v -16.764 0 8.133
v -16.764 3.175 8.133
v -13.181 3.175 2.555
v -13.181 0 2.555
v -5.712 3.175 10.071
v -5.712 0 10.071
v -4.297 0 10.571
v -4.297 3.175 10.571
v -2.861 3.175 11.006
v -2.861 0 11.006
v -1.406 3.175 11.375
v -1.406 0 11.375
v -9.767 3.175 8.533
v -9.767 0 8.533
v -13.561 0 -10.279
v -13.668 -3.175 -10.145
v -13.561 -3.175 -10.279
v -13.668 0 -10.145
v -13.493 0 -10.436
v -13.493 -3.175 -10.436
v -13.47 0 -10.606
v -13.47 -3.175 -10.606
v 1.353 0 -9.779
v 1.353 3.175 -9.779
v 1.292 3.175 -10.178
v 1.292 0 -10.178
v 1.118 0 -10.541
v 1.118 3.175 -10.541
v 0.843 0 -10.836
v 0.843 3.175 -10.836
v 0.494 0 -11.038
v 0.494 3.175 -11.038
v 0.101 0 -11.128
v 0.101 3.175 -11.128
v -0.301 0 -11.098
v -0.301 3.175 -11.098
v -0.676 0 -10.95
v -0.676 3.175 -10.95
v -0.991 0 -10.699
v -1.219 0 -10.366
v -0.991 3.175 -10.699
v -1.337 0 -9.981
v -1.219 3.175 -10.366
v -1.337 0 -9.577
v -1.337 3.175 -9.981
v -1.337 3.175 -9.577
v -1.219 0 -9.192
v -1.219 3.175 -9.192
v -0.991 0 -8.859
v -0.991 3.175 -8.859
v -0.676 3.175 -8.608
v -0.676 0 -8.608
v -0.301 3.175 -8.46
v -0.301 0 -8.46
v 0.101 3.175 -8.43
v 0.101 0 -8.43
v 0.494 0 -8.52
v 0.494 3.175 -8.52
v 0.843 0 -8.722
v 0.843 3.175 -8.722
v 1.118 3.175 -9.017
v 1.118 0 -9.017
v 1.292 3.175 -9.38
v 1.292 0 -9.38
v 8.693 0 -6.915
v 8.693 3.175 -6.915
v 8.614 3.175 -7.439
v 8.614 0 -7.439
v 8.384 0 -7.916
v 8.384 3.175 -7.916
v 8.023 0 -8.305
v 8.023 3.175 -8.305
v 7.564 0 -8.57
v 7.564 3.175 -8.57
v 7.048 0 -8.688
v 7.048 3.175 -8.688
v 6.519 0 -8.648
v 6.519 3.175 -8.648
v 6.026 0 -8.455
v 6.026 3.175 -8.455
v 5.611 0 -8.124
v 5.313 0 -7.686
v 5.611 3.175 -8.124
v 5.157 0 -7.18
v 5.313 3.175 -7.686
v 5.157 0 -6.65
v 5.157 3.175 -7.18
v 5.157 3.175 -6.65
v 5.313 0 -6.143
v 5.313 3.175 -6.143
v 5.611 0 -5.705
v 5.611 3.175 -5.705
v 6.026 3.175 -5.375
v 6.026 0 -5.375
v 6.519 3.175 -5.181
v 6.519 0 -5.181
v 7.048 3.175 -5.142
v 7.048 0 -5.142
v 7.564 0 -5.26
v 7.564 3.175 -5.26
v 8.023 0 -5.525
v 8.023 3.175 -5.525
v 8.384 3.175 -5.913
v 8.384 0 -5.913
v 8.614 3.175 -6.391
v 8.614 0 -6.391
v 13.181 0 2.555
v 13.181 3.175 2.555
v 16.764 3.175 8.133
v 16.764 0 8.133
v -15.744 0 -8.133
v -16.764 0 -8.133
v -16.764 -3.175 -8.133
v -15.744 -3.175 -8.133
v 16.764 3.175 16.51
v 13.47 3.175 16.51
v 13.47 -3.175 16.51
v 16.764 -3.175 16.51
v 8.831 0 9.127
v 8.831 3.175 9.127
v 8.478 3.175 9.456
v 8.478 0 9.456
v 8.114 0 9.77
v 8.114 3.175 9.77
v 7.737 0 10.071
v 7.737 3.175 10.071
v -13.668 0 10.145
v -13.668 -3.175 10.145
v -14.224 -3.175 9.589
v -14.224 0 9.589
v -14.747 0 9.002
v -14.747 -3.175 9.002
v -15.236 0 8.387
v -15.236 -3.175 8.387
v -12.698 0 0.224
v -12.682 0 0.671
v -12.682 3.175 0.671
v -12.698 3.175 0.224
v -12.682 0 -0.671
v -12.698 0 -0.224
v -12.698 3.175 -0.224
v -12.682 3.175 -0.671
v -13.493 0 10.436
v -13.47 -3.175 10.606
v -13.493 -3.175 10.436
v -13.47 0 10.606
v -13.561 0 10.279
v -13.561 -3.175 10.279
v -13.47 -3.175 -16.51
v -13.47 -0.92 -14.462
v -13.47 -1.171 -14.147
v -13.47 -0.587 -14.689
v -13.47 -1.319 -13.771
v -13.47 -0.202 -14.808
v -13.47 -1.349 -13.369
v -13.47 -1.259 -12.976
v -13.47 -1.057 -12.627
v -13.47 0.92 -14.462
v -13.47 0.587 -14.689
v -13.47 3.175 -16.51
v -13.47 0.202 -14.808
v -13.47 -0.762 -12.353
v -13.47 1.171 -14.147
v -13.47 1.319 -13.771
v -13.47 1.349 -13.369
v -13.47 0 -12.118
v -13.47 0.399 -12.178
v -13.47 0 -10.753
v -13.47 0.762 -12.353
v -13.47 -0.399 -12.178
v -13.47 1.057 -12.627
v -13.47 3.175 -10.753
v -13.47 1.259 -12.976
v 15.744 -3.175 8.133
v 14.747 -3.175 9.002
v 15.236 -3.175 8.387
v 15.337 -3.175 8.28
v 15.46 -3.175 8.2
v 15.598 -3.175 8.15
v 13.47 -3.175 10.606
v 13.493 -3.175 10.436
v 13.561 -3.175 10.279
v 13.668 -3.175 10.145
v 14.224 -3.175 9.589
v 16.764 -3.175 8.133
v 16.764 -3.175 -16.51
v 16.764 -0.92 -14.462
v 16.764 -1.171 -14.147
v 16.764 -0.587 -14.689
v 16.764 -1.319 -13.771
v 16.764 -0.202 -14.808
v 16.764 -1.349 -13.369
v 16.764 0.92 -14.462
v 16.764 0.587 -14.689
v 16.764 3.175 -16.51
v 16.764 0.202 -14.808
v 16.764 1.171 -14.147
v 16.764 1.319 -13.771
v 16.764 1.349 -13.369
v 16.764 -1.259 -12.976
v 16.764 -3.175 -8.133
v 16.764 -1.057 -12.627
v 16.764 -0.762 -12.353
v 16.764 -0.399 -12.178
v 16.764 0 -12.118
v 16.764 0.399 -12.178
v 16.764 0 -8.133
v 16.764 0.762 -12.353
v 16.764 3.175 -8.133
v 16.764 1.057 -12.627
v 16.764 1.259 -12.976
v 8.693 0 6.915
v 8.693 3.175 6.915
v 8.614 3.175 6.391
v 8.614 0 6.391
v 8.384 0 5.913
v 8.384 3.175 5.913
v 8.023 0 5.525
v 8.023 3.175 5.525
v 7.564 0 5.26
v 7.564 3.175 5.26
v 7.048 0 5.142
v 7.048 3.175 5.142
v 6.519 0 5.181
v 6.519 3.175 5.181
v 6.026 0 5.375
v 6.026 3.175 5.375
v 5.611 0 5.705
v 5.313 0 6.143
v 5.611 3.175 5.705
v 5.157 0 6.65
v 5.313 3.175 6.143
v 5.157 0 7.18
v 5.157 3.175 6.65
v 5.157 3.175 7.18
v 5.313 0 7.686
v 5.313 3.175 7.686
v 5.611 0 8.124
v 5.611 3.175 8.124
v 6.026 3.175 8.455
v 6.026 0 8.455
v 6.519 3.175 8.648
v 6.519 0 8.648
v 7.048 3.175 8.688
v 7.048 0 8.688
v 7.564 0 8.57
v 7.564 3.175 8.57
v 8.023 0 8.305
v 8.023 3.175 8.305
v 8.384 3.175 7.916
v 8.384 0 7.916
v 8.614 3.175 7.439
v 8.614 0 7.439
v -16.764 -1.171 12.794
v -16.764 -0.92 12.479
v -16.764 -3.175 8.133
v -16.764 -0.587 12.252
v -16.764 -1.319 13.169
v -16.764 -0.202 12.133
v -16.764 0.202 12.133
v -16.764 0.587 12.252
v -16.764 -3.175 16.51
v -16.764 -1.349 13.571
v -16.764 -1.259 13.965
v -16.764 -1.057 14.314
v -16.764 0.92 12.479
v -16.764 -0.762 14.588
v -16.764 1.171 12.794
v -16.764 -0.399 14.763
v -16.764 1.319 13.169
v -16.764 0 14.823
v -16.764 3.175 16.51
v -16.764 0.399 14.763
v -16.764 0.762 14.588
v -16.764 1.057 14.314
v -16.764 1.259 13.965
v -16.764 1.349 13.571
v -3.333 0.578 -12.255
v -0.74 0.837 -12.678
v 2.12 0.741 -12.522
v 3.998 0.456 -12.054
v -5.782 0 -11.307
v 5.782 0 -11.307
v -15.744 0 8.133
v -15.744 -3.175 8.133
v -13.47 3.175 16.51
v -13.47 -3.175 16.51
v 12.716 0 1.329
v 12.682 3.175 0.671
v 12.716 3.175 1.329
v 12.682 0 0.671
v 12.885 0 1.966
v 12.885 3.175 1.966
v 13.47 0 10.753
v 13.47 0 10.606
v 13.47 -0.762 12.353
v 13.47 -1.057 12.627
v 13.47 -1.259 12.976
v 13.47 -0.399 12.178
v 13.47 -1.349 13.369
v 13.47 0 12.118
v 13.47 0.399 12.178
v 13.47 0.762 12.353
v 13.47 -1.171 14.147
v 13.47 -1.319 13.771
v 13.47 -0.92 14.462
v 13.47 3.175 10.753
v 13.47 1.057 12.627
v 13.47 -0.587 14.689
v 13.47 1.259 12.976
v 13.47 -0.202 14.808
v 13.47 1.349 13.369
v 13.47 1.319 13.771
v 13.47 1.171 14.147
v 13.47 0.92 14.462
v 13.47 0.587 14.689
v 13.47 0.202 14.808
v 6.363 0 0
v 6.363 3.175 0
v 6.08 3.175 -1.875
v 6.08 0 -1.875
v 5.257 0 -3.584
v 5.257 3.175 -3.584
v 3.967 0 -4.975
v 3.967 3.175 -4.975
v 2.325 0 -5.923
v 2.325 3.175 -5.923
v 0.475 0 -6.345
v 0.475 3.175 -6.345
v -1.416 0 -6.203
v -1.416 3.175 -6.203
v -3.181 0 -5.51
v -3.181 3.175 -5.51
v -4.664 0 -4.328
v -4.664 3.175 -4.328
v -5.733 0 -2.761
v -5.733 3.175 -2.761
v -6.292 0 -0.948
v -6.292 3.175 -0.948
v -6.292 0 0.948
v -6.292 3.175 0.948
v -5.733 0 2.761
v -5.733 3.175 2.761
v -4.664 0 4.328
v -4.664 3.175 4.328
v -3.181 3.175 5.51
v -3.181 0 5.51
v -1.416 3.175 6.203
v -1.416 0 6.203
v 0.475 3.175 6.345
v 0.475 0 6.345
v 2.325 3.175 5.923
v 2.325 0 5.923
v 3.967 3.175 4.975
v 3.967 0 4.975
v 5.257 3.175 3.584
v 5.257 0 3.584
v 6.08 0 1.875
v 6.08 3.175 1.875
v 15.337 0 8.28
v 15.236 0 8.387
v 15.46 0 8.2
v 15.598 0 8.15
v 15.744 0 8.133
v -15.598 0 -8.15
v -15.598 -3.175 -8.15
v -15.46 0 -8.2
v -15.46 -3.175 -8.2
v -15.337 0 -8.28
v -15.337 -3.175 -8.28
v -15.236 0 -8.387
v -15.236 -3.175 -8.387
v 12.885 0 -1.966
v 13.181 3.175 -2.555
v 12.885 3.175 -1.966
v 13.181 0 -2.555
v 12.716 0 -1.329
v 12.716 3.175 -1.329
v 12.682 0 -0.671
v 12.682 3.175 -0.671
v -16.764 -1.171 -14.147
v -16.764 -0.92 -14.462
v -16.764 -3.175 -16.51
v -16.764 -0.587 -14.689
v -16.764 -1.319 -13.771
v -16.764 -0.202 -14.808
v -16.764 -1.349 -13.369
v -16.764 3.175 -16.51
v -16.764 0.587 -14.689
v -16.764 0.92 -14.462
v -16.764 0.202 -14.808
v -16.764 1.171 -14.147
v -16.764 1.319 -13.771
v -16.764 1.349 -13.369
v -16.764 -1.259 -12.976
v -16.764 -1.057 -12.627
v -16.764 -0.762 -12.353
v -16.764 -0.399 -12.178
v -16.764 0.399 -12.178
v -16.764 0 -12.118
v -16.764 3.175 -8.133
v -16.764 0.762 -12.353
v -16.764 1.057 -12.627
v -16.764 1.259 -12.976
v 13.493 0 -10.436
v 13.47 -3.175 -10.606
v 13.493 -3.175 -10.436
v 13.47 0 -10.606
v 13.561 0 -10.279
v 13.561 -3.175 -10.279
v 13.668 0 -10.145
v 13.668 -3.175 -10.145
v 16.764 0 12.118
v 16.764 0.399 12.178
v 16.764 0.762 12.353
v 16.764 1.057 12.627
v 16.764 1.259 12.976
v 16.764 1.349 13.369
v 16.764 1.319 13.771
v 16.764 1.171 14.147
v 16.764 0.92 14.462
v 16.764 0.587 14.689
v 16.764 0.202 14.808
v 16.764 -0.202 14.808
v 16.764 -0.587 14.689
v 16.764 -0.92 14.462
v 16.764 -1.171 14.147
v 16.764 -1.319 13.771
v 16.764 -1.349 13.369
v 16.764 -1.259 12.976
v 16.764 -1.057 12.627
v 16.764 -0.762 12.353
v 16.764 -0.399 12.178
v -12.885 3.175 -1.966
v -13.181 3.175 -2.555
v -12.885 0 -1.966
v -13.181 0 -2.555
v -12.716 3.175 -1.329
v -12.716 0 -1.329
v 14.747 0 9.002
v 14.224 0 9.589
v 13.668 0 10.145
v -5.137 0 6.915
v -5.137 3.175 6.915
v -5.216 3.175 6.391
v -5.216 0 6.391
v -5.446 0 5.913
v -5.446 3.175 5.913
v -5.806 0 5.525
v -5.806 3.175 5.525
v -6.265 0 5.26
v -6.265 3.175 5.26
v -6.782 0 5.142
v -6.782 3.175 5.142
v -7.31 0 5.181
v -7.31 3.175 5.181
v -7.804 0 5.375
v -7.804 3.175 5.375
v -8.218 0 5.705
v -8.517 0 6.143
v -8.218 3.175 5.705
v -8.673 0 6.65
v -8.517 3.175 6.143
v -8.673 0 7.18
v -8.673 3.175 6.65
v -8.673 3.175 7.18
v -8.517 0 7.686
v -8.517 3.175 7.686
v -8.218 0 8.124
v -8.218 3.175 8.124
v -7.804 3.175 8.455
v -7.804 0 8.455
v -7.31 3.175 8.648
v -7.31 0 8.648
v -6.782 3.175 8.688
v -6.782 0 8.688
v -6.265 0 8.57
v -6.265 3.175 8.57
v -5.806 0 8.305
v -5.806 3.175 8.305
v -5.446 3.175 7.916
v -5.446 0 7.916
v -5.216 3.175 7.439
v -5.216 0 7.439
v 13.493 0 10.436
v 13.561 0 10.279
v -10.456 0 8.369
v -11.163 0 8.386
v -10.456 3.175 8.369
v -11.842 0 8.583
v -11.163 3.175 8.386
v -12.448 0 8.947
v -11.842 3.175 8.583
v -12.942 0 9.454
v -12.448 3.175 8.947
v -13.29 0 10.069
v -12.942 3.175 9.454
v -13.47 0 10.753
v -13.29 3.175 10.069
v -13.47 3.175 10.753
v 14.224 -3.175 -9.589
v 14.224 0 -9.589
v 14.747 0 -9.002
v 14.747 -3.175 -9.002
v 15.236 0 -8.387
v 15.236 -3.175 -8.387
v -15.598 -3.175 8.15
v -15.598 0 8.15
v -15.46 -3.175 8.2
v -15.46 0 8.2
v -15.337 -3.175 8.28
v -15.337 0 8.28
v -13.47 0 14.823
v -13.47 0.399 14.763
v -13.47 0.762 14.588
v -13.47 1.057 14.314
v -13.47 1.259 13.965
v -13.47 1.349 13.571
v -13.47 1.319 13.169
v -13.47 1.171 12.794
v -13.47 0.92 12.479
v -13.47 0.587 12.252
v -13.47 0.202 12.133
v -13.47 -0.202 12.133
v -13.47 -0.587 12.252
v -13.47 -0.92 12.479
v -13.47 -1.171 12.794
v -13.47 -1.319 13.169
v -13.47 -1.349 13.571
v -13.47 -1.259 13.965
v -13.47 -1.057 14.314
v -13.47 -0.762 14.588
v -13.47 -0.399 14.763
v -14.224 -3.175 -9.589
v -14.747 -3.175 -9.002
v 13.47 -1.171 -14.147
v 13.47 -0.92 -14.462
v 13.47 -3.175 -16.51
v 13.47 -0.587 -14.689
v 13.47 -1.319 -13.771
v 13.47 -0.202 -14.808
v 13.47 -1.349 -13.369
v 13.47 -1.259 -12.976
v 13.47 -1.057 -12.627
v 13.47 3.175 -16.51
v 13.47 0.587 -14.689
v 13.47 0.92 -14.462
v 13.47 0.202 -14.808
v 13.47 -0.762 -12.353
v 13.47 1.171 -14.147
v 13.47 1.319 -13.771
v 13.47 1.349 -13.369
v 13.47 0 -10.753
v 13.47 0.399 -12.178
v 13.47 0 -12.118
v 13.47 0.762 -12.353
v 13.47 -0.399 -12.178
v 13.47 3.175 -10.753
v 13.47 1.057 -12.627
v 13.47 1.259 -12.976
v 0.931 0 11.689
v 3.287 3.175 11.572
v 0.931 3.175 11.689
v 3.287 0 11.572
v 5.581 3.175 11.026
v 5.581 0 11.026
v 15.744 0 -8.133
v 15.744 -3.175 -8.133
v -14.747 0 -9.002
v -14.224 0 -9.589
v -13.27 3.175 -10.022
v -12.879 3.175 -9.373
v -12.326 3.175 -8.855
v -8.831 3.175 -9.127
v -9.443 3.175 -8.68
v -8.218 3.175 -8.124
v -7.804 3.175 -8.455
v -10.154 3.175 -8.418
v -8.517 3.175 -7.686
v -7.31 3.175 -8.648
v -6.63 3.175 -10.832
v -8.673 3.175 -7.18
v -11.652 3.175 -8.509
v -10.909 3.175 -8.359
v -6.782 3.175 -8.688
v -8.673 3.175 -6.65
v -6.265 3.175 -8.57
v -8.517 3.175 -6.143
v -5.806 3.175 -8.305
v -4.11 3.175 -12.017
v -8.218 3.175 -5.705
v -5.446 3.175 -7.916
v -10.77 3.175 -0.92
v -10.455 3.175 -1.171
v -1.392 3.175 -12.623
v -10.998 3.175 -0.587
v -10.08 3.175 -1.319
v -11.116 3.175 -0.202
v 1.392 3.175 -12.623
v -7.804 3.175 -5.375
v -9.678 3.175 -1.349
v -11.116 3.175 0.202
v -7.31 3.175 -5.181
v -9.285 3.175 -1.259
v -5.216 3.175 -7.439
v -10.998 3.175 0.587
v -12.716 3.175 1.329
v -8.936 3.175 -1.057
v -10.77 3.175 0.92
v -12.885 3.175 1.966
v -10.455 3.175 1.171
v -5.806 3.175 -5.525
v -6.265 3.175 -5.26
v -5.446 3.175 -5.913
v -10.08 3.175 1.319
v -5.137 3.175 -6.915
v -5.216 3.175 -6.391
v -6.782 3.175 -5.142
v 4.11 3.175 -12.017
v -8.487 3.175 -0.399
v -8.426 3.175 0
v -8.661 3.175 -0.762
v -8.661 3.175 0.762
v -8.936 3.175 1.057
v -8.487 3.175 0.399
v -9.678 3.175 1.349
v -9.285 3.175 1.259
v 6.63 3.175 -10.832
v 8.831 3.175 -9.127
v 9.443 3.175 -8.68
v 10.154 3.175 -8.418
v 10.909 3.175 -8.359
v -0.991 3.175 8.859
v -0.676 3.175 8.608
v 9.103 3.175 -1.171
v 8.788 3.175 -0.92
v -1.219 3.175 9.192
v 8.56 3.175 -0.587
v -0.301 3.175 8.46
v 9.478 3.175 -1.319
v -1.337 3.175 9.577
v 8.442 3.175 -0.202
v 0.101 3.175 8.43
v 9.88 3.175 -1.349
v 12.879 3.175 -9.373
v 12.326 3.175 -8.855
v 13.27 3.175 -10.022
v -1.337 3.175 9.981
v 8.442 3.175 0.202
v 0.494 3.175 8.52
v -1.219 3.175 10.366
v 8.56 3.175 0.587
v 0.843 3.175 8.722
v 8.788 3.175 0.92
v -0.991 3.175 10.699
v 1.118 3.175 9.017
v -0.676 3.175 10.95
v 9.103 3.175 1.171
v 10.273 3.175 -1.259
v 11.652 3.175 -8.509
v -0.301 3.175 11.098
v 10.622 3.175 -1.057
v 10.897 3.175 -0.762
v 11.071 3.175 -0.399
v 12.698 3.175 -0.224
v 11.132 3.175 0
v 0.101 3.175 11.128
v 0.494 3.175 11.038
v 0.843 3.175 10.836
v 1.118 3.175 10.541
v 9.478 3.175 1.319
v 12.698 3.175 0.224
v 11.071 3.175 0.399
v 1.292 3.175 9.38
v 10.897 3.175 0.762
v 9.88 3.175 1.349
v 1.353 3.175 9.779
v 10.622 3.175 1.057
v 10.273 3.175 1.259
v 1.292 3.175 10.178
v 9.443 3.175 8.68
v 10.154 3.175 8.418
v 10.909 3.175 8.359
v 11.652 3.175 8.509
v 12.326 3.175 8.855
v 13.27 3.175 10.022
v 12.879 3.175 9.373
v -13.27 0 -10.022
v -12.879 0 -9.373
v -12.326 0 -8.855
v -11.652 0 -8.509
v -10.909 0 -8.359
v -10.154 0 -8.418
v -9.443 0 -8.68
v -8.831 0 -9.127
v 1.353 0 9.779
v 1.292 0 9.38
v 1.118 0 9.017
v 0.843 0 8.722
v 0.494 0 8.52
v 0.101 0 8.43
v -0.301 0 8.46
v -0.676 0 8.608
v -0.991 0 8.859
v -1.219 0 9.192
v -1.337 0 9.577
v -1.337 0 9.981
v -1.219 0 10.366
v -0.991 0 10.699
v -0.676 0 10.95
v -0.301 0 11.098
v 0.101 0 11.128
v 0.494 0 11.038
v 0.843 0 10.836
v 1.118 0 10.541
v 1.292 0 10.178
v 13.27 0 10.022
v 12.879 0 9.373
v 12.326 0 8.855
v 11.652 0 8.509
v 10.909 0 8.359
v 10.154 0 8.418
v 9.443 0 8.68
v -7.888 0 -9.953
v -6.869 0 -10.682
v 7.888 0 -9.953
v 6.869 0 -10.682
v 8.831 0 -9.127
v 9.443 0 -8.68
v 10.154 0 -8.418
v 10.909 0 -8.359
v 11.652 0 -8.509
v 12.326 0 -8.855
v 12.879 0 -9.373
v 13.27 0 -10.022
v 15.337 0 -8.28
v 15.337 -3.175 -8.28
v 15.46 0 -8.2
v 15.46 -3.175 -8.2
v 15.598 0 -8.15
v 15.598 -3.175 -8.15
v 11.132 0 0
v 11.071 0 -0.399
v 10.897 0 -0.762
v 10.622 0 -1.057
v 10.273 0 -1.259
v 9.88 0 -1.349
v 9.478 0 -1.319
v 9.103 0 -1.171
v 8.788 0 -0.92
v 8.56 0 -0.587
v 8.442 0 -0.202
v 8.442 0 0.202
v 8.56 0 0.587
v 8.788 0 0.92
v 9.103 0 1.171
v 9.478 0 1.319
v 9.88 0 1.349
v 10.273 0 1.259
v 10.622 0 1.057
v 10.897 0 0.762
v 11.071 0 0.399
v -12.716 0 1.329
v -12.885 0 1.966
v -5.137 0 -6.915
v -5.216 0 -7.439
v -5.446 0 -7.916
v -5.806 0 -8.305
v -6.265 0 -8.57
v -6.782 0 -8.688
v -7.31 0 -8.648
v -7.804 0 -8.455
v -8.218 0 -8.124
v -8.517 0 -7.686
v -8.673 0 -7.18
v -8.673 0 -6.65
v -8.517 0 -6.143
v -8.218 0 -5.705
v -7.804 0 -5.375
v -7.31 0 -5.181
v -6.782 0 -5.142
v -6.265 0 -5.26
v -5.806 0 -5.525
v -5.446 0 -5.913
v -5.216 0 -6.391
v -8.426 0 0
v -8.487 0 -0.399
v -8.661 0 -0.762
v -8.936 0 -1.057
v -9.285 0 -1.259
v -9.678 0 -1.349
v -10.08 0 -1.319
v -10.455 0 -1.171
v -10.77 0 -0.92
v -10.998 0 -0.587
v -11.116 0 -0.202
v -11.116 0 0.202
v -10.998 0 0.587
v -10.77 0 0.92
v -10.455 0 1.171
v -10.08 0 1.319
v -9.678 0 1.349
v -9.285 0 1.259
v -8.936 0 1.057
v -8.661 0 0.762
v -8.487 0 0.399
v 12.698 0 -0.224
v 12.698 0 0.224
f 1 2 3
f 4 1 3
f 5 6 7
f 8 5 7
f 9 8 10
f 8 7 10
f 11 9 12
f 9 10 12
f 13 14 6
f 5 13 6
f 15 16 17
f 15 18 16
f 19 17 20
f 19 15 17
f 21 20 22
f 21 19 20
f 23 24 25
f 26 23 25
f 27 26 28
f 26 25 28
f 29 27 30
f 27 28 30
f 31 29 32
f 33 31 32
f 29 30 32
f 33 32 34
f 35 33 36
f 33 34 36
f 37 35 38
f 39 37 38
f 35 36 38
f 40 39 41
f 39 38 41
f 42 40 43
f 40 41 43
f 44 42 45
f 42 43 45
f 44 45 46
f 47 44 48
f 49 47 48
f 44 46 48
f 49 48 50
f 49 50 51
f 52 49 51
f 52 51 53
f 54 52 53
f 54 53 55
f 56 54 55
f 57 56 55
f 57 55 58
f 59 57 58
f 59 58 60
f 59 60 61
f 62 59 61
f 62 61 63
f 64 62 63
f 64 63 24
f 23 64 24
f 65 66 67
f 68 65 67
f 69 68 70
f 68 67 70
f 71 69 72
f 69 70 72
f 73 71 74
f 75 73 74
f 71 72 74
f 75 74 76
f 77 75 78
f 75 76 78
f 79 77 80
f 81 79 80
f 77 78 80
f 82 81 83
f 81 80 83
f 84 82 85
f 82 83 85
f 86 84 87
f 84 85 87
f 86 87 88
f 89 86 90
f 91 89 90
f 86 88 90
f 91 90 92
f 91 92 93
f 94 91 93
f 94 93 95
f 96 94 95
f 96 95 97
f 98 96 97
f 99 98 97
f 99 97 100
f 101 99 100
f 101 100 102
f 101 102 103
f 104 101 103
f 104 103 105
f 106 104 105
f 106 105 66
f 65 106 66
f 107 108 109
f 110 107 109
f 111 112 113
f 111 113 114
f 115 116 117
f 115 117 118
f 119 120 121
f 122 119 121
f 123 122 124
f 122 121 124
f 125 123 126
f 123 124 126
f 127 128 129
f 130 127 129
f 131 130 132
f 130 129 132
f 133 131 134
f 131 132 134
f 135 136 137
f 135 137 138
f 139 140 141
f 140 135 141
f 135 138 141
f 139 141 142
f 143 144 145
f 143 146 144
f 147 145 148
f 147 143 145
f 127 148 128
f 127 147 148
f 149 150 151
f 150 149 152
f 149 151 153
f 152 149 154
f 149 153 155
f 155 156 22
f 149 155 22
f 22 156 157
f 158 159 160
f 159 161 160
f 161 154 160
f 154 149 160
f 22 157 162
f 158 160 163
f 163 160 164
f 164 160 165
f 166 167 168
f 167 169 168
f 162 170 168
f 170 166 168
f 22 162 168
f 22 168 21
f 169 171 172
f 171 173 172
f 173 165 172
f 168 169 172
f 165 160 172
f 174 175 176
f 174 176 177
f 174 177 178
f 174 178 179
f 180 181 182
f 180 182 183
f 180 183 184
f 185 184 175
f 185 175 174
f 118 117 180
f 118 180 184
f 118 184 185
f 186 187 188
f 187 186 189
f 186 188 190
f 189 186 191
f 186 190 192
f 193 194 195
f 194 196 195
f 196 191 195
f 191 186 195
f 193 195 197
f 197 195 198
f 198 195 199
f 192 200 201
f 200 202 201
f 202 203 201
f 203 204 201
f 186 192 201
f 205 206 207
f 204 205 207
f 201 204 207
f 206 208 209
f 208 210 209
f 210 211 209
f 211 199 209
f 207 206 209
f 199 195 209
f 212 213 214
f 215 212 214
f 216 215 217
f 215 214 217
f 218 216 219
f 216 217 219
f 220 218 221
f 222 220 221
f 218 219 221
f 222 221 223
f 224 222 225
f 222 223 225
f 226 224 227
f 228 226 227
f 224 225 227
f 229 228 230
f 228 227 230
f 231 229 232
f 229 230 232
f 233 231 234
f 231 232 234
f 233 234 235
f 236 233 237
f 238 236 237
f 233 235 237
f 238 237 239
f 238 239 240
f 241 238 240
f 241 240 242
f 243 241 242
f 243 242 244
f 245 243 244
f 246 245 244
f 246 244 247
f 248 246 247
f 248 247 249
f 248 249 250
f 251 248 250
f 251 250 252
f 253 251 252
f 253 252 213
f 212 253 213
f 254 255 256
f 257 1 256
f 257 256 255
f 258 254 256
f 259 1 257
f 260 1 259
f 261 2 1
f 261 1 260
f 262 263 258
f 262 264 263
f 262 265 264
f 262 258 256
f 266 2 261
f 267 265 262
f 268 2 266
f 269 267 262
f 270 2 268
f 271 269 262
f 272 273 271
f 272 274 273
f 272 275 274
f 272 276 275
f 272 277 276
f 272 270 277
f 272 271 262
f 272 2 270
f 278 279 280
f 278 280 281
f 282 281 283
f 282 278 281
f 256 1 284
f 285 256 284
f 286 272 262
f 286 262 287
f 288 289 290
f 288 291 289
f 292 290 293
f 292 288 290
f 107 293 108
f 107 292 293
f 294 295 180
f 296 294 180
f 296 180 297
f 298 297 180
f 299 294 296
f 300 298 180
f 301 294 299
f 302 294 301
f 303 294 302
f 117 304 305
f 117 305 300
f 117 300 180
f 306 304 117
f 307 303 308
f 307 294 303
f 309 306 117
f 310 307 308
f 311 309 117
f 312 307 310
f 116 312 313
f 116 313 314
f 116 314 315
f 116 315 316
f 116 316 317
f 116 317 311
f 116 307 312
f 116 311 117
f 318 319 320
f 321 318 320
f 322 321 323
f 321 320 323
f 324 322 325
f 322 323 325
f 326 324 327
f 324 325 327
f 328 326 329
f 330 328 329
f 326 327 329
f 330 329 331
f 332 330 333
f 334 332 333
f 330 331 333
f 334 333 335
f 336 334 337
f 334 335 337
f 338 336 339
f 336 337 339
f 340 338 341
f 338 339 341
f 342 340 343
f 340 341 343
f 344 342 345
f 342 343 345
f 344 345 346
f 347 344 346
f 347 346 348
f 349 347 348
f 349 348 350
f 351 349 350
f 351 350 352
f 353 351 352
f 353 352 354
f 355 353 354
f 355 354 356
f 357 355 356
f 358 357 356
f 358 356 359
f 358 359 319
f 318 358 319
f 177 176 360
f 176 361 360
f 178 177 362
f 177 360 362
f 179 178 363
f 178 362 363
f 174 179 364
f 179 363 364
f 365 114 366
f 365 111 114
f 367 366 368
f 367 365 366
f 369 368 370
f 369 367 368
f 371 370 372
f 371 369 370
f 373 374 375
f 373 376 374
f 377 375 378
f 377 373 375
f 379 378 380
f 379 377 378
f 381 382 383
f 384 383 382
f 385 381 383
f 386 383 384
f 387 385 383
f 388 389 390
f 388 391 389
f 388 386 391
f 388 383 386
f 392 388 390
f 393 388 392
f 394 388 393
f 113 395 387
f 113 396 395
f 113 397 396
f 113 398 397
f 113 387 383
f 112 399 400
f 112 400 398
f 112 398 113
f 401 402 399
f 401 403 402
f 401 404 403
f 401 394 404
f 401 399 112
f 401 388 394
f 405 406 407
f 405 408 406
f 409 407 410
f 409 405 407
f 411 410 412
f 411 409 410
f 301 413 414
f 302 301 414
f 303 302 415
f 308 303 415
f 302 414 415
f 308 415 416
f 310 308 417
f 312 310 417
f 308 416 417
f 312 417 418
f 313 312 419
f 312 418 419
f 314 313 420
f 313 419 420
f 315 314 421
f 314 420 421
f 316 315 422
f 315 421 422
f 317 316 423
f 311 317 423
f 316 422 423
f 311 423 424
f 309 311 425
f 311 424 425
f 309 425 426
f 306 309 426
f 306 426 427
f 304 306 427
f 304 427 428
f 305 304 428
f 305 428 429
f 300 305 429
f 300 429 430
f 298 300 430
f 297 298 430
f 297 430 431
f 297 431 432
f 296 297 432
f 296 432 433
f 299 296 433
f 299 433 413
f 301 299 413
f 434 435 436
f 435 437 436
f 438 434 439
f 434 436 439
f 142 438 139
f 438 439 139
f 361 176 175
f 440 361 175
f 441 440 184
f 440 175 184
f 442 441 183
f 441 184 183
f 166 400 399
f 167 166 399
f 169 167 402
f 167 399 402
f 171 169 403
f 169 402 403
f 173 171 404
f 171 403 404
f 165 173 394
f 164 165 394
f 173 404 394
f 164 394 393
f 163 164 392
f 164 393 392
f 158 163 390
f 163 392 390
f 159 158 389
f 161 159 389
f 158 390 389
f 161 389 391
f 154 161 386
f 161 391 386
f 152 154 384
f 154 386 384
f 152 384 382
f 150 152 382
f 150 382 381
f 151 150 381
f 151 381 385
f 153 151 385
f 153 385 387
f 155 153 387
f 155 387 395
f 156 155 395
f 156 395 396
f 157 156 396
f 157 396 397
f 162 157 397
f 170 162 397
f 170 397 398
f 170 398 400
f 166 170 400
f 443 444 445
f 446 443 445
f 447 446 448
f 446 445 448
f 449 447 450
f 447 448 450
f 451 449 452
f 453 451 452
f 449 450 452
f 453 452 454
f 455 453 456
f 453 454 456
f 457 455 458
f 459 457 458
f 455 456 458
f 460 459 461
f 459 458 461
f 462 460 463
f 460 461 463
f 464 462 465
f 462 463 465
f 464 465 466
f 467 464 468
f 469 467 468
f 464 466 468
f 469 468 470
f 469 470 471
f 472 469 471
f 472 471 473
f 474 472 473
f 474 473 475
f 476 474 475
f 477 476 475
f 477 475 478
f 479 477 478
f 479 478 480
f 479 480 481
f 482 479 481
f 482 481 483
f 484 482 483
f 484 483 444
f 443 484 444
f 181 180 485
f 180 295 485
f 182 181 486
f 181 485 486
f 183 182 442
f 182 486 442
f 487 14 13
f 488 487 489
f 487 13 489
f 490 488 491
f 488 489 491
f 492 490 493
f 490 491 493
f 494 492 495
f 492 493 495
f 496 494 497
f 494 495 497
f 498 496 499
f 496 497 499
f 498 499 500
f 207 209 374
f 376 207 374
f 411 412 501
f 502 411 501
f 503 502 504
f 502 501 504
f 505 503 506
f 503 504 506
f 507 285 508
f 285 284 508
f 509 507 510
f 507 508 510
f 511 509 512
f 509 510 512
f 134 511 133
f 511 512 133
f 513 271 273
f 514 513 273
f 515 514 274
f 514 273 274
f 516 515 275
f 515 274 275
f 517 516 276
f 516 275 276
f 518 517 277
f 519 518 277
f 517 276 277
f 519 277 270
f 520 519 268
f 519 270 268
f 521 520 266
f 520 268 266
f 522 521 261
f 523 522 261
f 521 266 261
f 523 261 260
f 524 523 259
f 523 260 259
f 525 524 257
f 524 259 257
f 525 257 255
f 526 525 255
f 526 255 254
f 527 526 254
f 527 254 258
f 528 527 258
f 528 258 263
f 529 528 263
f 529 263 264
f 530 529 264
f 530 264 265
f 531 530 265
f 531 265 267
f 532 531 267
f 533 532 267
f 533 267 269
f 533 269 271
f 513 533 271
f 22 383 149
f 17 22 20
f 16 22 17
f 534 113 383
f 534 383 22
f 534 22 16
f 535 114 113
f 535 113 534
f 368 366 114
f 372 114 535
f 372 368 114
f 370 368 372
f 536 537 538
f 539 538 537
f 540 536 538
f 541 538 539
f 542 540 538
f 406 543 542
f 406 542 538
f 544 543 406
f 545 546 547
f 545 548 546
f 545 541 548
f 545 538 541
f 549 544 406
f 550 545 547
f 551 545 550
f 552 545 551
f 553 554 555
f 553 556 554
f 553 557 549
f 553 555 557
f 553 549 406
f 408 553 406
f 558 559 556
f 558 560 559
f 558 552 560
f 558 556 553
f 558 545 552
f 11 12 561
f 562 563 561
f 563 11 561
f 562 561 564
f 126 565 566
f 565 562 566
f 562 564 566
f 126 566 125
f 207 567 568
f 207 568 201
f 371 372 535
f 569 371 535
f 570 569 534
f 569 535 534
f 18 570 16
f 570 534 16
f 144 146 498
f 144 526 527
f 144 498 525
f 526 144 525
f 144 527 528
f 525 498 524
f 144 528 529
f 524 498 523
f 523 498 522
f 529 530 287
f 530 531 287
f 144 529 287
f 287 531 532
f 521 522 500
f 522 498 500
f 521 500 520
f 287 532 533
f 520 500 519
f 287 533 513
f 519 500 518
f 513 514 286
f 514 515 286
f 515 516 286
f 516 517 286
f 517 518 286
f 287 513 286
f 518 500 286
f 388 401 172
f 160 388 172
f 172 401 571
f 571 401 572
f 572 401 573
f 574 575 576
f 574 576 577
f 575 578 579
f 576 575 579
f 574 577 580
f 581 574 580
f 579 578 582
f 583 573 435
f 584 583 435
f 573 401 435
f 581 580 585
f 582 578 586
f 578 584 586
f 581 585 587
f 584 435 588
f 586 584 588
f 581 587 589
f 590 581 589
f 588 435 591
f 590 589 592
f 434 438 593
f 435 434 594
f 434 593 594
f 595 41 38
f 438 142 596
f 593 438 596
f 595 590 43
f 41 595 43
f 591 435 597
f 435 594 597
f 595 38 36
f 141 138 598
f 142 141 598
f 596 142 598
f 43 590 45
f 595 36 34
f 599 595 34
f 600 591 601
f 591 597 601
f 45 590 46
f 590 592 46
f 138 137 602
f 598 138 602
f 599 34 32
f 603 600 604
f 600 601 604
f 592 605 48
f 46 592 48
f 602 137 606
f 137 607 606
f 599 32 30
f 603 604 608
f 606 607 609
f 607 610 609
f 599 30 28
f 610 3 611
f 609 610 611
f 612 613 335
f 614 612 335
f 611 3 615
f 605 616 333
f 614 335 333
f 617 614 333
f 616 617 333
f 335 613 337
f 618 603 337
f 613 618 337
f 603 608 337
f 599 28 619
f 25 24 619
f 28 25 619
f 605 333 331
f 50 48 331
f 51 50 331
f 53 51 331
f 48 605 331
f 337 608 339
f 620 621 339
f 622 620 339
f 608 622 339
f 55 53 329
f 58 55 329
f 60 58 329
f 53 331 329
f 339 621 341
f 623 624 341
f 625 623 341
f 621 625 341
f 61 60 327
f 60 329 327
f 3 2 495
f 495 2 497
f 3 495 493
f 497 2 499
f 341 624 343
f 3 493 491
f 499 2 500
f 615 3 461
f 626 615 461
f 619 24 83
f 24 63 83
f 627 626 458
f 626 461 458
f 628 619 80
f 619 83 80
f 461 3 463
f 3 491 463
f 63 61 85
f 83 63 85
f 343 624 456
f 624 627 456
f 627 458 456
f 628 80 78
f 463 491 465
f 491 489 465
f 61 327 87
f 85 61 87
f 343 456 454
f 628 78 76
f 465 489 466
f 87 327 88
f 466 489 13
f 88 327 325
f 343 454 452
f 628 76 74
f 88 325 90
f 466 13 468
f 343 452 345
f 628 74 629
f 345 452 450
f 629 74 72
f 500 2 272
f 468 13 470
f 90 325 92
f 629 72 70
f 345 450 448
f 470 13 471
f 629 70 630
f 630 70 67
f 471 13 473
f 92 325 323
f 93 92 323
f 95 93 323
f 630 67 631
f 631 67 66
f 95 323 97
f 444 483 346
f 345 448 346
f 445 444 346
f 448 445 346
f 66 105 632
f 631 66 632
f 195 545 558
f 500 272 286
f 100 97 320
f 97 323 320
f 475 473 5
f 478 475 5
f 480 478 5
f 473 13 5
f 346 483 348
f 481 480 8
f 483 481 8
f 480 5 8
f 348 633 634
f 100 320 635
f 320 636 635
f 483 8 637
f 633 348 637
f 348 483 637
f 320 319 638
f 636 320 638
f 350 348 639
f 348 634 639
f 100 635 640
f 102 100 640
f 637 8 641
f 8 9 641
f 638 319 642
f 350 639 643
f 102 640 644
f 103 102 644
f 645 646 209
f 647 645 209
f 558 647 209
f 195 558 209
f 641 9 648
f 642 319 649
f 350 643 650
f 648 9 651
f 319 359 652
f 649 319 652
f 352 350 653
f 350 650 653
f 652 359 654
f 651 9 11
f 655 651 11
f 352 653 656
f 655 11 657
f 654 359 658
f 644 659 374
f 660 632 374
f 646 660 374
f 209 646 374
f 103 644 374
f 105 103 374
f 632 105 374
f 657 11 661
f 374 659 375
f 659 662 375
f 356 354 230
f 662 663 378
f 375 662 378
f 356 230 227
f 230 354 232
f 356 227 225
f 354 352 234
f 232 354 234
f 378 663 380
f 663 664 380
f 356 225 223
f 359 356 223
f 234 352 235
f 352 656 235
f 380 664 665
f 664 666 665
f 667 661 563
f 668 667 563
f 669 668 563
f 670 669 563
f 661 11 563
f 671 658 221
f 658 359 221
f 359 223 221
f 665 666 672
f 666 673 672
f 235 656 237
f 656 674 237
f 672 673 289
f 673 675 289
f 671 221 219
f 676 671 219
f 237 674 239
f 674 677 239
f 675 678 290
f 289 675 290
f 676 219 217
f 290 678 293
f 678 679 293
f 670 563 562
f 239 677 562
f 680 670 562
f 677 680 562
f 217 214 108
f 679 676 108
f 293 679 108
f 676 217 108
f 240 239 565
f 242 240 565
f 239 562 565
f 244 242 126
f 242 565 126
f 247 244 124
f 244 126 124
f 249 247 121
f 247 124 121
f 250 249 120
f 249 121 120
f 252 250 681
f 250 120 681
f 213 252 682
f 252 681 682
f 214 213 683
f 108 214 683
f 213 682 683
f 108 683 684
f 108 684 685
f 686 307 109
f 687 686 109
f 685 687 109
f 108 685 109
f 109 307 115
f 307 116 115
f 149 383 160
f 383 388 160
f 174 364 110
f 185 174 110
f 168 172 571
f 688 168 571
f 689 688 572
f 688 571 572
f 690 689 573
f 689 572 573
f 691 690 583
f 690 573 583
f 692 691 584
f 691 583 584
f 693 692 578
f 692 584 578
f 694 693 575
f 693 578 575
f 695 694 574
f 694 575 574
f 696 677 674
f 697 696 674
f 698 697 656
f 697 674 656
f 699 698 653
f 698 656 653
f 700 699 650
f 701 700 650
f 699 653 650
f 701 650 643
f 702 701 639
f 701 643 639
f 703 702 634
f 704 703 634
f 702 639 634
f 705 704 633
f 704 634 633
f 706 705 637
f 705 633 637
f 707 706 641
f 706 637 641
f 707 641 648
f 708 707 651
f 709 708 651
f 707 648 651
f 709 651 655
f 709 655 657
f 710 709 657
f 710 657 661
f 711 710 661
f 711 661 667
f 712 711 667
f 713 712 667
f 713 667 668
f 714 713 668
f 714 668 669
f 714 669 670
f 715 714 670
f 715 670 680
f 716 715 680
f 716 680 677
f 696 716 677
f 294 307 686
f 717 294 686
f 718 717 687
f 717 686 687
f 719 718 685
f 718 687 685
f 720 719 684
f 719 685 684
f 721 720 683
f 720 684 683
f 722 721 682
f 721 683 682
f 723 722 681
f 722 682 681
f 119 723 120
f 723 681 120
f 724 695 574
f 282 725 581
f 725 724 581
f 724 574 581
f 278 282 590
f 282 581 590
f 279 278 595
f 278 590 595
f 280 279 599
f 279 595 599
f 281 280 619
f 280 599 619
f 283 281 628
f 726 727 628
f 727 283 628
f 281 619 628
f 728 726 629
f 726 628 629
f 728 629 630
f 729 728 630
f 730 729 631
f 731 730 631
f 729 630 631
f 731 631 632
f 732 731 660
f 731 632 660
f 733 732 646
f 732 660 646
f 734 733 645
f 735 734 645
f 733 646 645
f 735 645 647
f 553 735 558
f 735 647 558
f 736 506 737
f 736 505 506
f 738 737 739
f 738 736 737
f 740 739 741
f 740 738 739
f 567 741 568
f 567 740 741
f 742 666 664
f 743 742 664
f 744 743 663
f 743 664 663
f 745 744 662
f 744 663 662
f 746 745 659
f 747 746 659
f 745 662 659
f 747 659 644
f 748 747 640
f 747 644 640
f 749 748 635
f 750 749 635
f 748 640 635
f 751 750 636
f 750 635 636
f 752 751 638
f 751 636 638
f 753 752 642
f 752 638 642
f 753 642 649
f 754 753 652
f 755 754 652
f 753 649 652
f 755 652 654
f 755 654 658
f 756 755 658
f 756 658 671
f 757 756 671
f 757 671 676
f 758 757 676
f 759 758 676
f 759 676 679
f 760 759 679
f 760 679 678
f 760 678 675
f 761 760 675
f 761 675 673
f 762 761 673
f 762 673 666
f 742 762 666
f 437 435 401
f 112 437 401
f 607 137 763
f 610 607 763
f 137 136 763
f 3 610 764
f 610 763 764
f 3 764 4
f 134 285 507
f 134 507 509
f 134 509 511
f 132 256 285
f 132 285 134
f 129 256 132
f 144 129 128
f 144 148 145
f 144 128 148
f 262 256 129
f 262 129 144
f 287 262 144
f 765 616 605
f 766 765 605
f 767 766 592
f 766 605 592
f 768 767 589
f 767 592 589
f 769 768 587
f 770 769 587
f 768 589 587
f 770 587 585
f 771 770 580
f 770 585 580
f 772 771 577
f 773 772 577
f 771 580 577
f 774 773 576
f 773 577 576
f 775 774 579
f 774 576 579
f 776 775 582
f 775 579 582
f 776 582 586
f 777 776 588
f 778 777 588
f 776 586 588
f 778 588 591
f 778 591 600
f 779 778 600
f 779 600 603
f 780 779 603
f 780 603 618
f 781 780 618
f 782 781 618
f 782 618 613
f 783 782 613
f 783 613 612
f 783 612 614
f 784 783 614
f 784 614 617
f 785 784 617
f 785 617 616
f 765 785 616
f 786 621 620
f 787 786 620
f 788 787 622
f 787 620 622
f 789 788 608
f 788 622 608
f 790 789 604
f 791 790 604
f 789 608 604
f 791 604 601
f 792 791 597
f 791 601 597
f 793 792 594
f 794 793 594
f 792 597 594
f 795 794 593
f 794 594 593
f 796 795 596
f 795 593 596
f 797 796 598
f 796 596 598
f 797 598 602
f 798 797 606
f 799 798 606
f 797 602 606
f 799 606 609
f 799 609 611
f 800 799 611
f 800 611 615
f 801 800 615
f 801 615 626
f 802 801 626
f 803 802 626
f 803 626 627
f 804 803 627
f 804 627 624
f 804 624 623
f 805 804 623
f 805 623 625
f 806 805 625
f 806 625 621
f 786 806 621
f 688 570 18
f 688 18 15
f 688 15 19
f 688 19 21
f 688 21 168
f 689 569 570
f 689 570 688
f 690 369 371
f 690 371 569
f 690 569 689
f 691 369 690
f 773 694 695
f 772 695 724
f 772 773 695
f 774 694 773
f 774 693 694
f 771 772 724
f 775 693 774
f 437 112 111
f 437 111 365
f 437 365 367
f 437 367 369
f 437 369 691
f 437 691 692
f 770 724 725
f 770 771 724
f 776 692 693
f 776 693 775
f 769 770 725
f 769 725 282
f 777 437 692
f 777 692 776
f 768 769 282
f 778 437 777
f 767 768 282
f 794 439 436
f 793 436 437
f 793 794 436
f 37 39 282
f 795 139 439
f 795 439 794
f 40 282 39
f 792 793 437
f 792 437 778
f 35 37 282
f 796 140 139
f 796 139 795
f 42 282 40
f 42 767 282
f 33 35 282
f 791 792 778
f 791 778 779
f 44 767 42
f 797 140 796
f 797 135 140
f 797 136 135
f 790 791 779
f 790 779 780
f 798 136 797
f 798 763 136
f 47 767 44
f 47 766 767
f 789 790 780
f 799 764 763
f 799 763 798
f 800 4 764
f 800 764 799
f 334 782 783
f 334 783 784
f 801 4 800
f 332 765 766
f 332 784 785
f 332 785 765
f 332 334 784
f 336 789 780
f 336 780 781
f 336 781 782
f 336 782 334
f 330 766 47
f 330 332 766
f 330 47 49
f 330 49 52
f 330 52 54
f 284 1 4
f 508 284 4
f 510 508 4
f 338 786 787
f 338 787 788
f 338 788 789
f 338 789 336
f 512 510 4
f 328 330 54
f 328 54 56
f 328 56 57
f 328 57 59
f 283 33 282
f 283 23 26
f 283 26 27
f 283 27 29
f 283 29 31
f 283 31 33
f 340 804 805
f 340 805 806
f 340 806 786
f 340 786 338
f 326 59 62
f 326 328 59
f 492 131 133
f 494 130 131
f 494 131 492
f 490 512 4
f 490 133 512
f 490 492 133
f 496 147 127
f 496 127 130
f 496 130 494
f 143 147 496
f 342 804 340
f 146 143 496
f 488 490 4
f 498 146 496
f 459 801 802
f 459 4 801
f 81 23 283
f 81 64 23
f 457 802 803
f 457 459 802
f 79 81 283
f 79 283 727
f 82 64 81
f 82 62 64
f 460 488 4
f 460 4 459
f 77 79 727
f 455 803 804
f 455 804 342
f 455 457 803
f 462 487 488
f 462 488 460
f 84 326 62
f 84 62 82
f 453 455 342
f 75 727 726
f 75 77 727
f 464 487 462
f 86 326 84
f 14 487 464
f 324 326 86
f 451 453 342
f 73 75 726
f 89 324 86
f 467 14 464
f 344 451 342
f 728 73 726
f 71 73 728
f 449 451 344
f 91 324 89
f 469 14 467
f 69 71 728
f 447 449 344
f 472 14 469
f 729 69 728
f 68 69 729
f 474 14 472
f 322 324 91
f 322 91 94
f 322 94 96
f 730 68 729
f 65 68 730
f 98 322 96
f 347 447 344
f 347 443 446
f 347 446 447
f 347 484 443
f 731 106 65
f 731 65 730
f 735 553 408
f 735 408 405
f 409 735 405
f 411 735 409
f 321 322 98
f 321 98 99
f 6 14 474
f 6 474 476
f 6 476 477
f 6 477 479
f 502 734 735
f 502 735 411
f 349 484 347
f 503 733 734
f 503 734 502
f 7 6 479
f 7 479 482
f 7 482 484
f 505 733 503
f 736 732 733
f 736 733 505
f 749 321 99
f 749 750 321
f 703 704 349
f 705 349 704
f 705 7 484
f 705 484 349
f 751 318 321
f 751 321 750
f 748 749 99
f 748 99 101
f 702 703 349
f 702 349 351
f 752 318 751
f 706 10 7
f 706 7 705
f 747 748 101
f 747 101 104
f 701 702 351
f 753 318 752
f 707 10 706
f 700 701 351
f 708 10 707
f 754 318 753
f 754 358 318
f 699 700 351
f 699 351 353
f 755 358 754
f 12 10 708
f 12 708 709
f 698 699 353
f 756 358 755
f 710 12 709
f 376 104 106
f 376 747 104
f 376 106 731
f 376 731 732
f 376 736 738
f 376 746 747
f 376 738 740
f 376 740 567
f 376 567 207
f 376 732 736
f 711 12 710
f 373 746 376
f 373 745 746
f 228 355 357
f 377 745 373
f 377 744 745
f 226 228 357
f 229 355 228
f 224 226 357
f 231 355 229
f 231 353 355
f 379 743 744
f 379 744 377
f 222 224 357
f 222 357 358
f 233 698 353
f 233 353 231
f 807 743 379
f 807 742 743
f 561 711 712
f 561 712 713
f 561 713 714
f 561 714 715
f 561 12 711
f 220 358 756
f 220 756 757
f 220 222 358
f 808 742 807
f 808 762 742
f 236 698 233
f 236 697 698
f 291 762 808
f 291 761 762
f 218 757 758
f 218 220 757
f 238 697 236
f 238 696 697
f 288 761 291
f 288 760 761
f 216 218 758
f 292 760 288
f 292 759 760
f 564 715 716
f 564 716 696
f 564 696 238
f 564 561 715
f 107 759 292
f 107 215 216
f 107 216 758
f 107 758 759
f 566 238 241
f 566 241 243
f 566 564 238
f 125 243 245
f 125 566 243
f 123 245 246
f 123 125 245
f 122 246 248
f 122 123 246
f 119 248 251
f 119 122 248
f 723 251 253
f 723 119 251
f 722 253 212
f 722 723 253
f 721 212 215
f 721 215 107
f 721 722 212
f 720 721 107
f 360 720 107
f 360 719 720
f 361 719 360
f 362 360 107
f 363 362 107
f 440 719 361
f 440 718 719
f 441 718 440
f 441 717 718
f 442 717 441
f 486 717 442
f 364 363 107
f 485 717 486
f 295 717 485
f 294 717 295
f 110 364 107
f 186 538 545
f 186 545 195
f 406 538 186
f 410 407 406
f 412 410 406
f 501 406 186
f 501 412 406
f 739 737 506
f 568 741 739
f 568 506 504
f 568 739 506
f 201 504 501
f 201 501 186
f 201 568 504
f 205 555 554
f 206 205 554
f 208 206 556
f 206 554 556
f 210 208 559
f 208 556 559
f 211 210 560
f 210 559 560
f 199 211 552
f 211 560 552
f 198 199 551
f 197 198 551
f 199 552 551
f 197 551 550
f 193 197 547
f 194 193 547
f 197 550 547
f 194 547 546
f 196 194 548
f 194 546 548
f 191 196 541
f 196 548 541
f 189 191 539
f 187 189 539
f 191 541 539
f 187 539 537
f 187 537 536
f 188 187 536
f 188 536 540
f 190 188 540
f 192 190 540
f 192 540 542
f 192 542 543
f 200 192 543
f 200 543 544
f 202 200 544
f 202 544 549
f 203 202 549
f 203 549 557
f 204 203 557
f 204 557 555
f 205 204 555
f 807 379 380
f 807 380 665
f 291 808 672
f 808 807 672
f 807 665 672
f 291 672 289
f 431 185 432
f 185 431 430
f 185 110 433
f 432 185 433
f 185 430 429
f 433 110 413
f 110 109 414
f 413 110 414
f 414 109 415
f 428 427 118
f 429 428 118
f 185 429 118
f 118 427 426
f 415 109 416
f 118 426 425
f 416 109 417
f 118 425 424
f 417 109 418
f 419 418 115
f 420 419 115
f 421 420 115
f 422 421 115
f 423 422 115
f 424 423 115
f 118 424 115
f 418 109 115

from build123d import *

# Parameters (mm, degrees)
SKETCH1_W                  = 33.528
SKETCH1_H                  = 33.02
BOSS_EXTRUDE1_DEPTH        = 3.175
CUT_EXTRUDE1_DEPTH         = 4.175
SKETCH3_W                  = 3.29438
SKETCH3_H                  = 8.37692
BOSS_EXTRUDE2_DEPTH        = 3.175
CUT_EXTRUDE2_DEPTH         = 7.35
SKETCH5_W                  = 3.29438
SKETCH5_H                  = 8.37692
BOSS_EXTRUDE3_DEPTH        = 3.175
CUT_EXTRUDE3_DEPTH         = 7.35
SKETCH7_W                  = 3.29438
SKETCH7_H                  = 8.37692
BOSS_EXTRUDE4_DEPTH        = 3.175
CUT_EXTRUDE4_DEPTH         = 7.35
SKETCH9_W                  = 3.29438
SKETCH9_H                  = 8.37692
BOSS_EXTRUDE5_DEPTH        = 3.175
CUT_EXTRUDE5_DEPTH         = 3.175
CUT_EXTRUDE6_DEPTH         = 3.175
CUT_EXTRUDE7_DEPTH         = 3.175
CUT_EXTRUDE8_DEPTH         = 3.175
HOLE1_D                    = 12.7254
HOLE1_DEPTH                = 3.175025
M2_5_CLEARANCE_HOLE1_D     = 2.7051
M2_5_CLEARANCE_HOLE1_DEPTH = 3.175025
M3_CLEARANCE_HOLE1_D       = 3.556
M3_CLEARANCE_HOLE1_DEPTH   = 3.175025
M2_5_CLEARANCE_HOLE2_D     = 2.7051
M2_5_CLEARANCE_HOLE2_DEPTH = 3.29438
M2_5_CLEARANCE_HOLE3_D     = 2.7051
M2_5_CLEARANCE_HOLE3_DEPTH = 3.29438
M2_5_CLEARANCE_HOLE4_D     = 2.7051
M2_5_CLEARANCE_HOLE4_DEPTH = 3.29443
FILLET1_R                  = 0.635
FILLET2_R                  = 3.175
CUT_EXTRUDE9_REACH         = 5.175
CUT_EXTRUDE12_REACH        = 7.42
SKETCH30_W                 = 14.449204344
SKETCH30_H                 = 9.791237154


with BuildPart() as part:
    # Sketch1 → Boss-Extrude1 (new body)
    with BuildSketch(Plane.XZ):
        Rectangle(SKETCH1_W, SKETCH1_H)
    extrude(amount=-BOSS_EXTRUDE1_DEPTH)

    # Sketch2 → Cut-Extrude1 (cut, through all)
    with BuildSketch(Plane(origin=(0, 3.175, 0), x_dir=(-1, 0, 0), z_dir=(0, 1, 0))):
        with BuildLine():
            Line((-13.46962, 16.51), (-13.46962, 10.753335779))
            ThreePointArc((-13.46962, 10.753335779), (-11.652039651, 8.508623021), (-8.8307675, 9.127296717))
            ThreePointArc((-8.8307675, 9.127296717), (0, 12.7), (8.8307675, 9.127296717))
            ThreePointArc((8.8307675, 9.127296717), (11.652039651, 8.508623021), (13.46962, 10.753335779))
            Line((13.46962, 10.753335779), (13.46962, 16.51))
            Line((13.46962, 16.51), (-13.46962, 16.51))
        make_face()
    extrude(amount=-CUT_EXTRUDE1_DEPTH, mode=Mode.SUBTRACT)

    # Sketch3 → Boss-Extrude2 (add)
    with BuildSketch(Plane.XZ):
        with Locations((-15.11681, 12.32154)):
            Rectangle(SKETCH3_W, SKETCH3_H)
    extrude(amount=BOSS_EXTRUDE2_DEPTH)

    # Sketch4 → Cut-Extrude2 (cut, through all)
    with BuildSketch(Plane(origin=(0, 3.175, 0), x_dir=(-1, 0, 0), z_dir=(0, 1, 0))):
        with BuildLine():
            Line((-16.764, 8.13308), (-16.764, -8.13308))
            Line((-16.764, -8.13308), (-12.593680427, -1.639882101))
            ThreePointArc((-12.593680427, -1.639882101), (-12.7, 0), (-12.593680427, 1.639882101))
            Line((-12.593680427, 1.639882101), (-16.764, 8.13308))
        make_face()
    extrude(amount=-CUT_EXTRUDE2_DEPTH, mode=Mode.SUBTRACT)

    # Sketch5 → Boss-Extrude3 (add)
    with BuildSketch(Plane.XZ):
        with Locations((15.11681, 12.32154)):
            Rectangle(SKETCH5_W, SKETCH5_H)
    extrude(amount=BOSS_EXTRUDE3_DEPTH)

    # Sketch6 → Cut-Extrude3 (cut, through all)
    with BuildSketch(Plane(origin=(0, 3.175, 0), x_dir=(-1, 0, 0), z_dir=(0, 1, 0))):
        with BuildLine():
            Line((13.46962, -16.51), (13.46962, -10.753335779))
            ThreePointArc((13.46962, -10.753335779), (11.652039651, -8.508623021), (8.8307675, -9.127296717))
            ThreePointArc((8.8307675, -9.127296717), (0, -12.7), (-8.8307675, -9.127296717))
            ThreePointArc((-8.8307675, -9.127296717), (-11.652039651, -8.508623021), (-13.46962, -10.753335779))
            Line((-13.46962, -10.753335779), (-13.46962, -16.51))
            Line((-13.46962, -16.51), (13.46962, -16.51))
        make_face()
    extrude(amount=-CUT_EXTRUDE3_DEPTH, mode=Mode.SUBTRACT)

    # Sketch7 → Boss-Extrude4 (add)
    with BuildSketch(Plane.XZ):
        with Locations((15.11681, -12.32154)):
            Rectangle(SKETCH7_W, SKETCH7_H)
    extrude(amount=BOSS_EXTRUDE4_DEPTH)

    # Sketch8 → Cut-Extrude4 (cut, through all)
    with BuildSketch(Plane(origin=(0, 3.175, 0), x_dir=(-1, 0, 0), z_dir=(0, 1, 0))):
        with BuildLine():
            Line((16.764, -8.13308), (16.764, 8.13308))
            Line((16.764, 8.13308), (12.593680427, 1.639882101))
            ThreePointArc((12.593680427, 1.639882101), (12.7, 0), (12.593680427, -1.639882101))
            Line((12.593680427, -1.639882101), (16.764, -8.13308))
        make_face()
    extrude(amount=-CUT_EXTRUDE4_DEPTH, mode=Mode.SUBTRACT)

    # Sketch9 → Boss-Extrude5 (add)
    with BuildSketch(Plane.XZ):
        with Locations((-15.11681, -12.32154)):
            Rectangle(SKETCH9_W, SKETCH9_H)
    extrude(amount=BOSS_EXTRUDE5_DEPTH)

    # Sketch10 → Cut-Extrude5 (cut)
    with BuildSketch(Plane.XZ.offset(3.175)):
        with BuildLine():
            Line((15.422429016, -8.13308), (13.46962, -8.13308))
            Line((13.46962, -8.13308), (13.46962, -10.329337463))
            ThreePointArc((13.46962, -10.329337463), (14.503938678, -9.282703292), (15.422429016, -8.13308))
        make_face()
    extrude(amount=-CUT_EXTRUDE5_DEPTH, mode=Mode.SUBTRACT)

    # Sketch11 → Cut-Extrude6 (cut)
    with BuildSketch(Plane.XZ.offset(3.175)):
        with BuildLine():
            Line((13.46962, 10.329337463), (13.46962, 8.13308))
            Line((13.46962, 8.13308), (15.422429016, 8.13308))
            ThreePointArc((15.422429016, 8.13308), (14.503938678, 9.282703292), (13.46962, 10.329337463))
        make_face()
    extrude(amount=-CUT_EXTRUDE6_DEPTH, mode=Mode.SUBTRACT)

    # Sketch12 → Cut-Extrude7 (cut)
    with BuildSketch(Plane.XZ.offset(3.175)):
        with BuildLine():
            Line((-15.422429016, 8.13308), (-13.46962, 8.13308))
            Line((-13.46962, 8.13308), (-13.46962, 10.329337463))
            ThreePointArc((-13.46962, 10.329337463), (-14.503938678, 9.282703292), (-15.422429016, 8.13308))
        make_face()
    extrude(amount=-CUT_EXTRUDE7_DEPTH, mode=Mode.SUBTRACT)

    # Sketch13 → Cut-Extrude8 (cut)
    with BuildSketch(Plane.XZ.offset(3.175)):
        with BuildLine():
            Line((-13.46962, -10.329337463), (-13.46962, -8.13308))
            Line((-13.46962, -8.13308), (-15.422429016, -8.13308))
            ThreePointArc((-15.422429016, -8.13308), (-14.503938678, -9.282703292), (-13.46962, -10.329337463))
        make_face()
    extrude(amount=-CUT_EXTRUDE8_DEPTH, mode=Mode.SUBTRACT)

    # Hole1
    with Locations(Plane(origin=(0, 0, 0), x_dir=(-1, 0, 0), z_dir=(0, -1, 0))):
        with Locations((0, 0)):
            Hole(HOLE1_D / 2, depth=HOLE1_DEPTH)

    # M2.5 Clearance Hole1
    with Locations(Plane(origin=(0, 0, 0), x_dir=(-1, 0, 0), z_dir=(0, -1, 0))):
        with Locations((0, -9.779), (9.779, 0), (0, 9.779), (-9.779, 0)):
            Hole(M2_5_CLEARANCE_HOLE1_D / 2, depth=M2_5_CLEARANCE_HOLE1_DEPTH)

    # M3 Clearance Hole1
    with Locations(Plane(origin=(0, 0, 0), x_dir=(-1, 0, 0), z_dir=(0, -1, 0))):
        with Locations((6.914797213, -6.914797213), (6.914797213, 6.914797213), (-6.914797213, 6.914797213), (-6.914797213, -6.914797213)):
            Hole(M3_CLEARANCE_HOLE1_D / 2, depth=M3_CLEARANCE_HOLE1_DEPTH)

    # M2.5 Clearance Hole2
    with Locations(Plane(origin=(16.764, 0, 0), x_dir=(0, 0, -1), z_dir=(1, 0, 0))):
        with Locations((13.470384182, 0)):
            Hole(M2_5_CLEARANCE_HOLE2_D / 2, depth=M2_5_CLEARANCE_HOLE2_DEPTH)

    # M2.5 Clearance Hole3
    with Locations(Plane.ZY.offset(-13.46962)):
        with Locations((13.470384182, 0)):
            Hole(M2_5_CLEARANCE_HOLE3_D / 2, depth=M2_5_CLEARANCE_HOLE3_DEPTH)

    # M2.5 Clearance Hole4
    with Locations(Plane(origin=(-13.46962, 0, 0), x_dir=(0, 0, -1), z_dir=(1, 0, 0))):
        with Locations((-13.470384182, 0), (13.470384182, 0)):
            Hole(M2_5_CLEARANCE_HOLE4_D / 2, depth=M2_5_CLEARANCE_HOLE4_DEPTH)

    # Fillet1
    fillet1_edges = [part.edges().sort_by_distance(p)[0] for p in [
        (-13.46962, -1.5875, -10.329337463),
        (-15.422429016, -1.5875, 8.13308),
        (15.422429016, -1.5875, -8.13308),
        (15.422429016, -1.5875, 8.13308),
        (13.46962, -1.5875, -10.329337463),
        (-13.46962, -1.5875, 10.329337463),
        (-15.422429016, -1.5875, -8.13308),
        (13.46962, -1.5875, 10.329337463),
    ]]
    fillet(fillet1_edges, radius=FILLET1_R)

    # Fillet2
    fillet2_edges = [part.edges().sort_by_distance(p)[0] for p in [
        (-12.593680427, 1.5875, -1.639882101),
        (12.593680427, 1.5875, -1.639882101),
        (-12.593680427, 1.5875, 1.639882101),
        (12.593680427, 1.5875, 1.639882101),
    ]]
    fillet(fillet2_edges, radius=FILLET2_R)

    # Sketch26 → Cut-Extrude9 (cut, up to next)
    with BuildSketch(Plane.XZ, mode=Mode.PRIVATE) as cut_extrude9_sk1:
        with BuildLine():
            Line((-9.767427274, 8.532567661), (-5.711894532, 10.070912798))
            ThreePointArc((-5.711894532, 10.070912798), (-3.581292847, 10.796642581), (-1.406006336, 11.374808519))
            ThreePointArc((-1.406006336, 11.374808519), (3.286728936, 11.571725124), (7.737358426, 10.070912798))
            ThreePointArc((7.737358426, 10.070912798), (-0.72214173, 12.679452327), (-8.8307675, 9.127296717))
            ThreePointArc((-8.8307675, 9.127296717), (-9.268785679, 8.78219321), (-9.767427274, 8.532567661))
        make_face()
    cut_extrude9_tool1 = extrude(cut_extrude9_sk1.sketch, amount=-CUT_EXTRUDE9_REACH, mode=Mode.PRIVATE) & part.part
    add(cut_extrude9_tool1.solids().sort_by_distance((-1.945542, 0, 11.38762))[0], mode=Mode.SUBTRACT)

    # Sketch30 → Cut-Extrude12 (cut, up to next)
    with BuildSketch(Plane(origin=(0, -5.02784088, -3.068243182), x_dir=(-1, 0, 0), z_dir=(0, -0.853608475, -0.520915129)), mode=Mode.PRIVATE) as cut_extrude12_sk1:
        with Locations((0.285206665, 14.086824926)):
            Rectangle(SKETCH30_W, SKETCH30_H)
    cut_extrude12_tool1 = extrude(cut_extrude12_sk1.sketch, amount=CUT_EXTRUDE12_REACH, mode=Mode.PRIVATE) & part.part
    add(cut_extrude12_tool1.solids().sort_by_distance((-0.285207, 2.310199, -15.092876))[0], mode=Mode.SUBTRACT)


solid = part.part
